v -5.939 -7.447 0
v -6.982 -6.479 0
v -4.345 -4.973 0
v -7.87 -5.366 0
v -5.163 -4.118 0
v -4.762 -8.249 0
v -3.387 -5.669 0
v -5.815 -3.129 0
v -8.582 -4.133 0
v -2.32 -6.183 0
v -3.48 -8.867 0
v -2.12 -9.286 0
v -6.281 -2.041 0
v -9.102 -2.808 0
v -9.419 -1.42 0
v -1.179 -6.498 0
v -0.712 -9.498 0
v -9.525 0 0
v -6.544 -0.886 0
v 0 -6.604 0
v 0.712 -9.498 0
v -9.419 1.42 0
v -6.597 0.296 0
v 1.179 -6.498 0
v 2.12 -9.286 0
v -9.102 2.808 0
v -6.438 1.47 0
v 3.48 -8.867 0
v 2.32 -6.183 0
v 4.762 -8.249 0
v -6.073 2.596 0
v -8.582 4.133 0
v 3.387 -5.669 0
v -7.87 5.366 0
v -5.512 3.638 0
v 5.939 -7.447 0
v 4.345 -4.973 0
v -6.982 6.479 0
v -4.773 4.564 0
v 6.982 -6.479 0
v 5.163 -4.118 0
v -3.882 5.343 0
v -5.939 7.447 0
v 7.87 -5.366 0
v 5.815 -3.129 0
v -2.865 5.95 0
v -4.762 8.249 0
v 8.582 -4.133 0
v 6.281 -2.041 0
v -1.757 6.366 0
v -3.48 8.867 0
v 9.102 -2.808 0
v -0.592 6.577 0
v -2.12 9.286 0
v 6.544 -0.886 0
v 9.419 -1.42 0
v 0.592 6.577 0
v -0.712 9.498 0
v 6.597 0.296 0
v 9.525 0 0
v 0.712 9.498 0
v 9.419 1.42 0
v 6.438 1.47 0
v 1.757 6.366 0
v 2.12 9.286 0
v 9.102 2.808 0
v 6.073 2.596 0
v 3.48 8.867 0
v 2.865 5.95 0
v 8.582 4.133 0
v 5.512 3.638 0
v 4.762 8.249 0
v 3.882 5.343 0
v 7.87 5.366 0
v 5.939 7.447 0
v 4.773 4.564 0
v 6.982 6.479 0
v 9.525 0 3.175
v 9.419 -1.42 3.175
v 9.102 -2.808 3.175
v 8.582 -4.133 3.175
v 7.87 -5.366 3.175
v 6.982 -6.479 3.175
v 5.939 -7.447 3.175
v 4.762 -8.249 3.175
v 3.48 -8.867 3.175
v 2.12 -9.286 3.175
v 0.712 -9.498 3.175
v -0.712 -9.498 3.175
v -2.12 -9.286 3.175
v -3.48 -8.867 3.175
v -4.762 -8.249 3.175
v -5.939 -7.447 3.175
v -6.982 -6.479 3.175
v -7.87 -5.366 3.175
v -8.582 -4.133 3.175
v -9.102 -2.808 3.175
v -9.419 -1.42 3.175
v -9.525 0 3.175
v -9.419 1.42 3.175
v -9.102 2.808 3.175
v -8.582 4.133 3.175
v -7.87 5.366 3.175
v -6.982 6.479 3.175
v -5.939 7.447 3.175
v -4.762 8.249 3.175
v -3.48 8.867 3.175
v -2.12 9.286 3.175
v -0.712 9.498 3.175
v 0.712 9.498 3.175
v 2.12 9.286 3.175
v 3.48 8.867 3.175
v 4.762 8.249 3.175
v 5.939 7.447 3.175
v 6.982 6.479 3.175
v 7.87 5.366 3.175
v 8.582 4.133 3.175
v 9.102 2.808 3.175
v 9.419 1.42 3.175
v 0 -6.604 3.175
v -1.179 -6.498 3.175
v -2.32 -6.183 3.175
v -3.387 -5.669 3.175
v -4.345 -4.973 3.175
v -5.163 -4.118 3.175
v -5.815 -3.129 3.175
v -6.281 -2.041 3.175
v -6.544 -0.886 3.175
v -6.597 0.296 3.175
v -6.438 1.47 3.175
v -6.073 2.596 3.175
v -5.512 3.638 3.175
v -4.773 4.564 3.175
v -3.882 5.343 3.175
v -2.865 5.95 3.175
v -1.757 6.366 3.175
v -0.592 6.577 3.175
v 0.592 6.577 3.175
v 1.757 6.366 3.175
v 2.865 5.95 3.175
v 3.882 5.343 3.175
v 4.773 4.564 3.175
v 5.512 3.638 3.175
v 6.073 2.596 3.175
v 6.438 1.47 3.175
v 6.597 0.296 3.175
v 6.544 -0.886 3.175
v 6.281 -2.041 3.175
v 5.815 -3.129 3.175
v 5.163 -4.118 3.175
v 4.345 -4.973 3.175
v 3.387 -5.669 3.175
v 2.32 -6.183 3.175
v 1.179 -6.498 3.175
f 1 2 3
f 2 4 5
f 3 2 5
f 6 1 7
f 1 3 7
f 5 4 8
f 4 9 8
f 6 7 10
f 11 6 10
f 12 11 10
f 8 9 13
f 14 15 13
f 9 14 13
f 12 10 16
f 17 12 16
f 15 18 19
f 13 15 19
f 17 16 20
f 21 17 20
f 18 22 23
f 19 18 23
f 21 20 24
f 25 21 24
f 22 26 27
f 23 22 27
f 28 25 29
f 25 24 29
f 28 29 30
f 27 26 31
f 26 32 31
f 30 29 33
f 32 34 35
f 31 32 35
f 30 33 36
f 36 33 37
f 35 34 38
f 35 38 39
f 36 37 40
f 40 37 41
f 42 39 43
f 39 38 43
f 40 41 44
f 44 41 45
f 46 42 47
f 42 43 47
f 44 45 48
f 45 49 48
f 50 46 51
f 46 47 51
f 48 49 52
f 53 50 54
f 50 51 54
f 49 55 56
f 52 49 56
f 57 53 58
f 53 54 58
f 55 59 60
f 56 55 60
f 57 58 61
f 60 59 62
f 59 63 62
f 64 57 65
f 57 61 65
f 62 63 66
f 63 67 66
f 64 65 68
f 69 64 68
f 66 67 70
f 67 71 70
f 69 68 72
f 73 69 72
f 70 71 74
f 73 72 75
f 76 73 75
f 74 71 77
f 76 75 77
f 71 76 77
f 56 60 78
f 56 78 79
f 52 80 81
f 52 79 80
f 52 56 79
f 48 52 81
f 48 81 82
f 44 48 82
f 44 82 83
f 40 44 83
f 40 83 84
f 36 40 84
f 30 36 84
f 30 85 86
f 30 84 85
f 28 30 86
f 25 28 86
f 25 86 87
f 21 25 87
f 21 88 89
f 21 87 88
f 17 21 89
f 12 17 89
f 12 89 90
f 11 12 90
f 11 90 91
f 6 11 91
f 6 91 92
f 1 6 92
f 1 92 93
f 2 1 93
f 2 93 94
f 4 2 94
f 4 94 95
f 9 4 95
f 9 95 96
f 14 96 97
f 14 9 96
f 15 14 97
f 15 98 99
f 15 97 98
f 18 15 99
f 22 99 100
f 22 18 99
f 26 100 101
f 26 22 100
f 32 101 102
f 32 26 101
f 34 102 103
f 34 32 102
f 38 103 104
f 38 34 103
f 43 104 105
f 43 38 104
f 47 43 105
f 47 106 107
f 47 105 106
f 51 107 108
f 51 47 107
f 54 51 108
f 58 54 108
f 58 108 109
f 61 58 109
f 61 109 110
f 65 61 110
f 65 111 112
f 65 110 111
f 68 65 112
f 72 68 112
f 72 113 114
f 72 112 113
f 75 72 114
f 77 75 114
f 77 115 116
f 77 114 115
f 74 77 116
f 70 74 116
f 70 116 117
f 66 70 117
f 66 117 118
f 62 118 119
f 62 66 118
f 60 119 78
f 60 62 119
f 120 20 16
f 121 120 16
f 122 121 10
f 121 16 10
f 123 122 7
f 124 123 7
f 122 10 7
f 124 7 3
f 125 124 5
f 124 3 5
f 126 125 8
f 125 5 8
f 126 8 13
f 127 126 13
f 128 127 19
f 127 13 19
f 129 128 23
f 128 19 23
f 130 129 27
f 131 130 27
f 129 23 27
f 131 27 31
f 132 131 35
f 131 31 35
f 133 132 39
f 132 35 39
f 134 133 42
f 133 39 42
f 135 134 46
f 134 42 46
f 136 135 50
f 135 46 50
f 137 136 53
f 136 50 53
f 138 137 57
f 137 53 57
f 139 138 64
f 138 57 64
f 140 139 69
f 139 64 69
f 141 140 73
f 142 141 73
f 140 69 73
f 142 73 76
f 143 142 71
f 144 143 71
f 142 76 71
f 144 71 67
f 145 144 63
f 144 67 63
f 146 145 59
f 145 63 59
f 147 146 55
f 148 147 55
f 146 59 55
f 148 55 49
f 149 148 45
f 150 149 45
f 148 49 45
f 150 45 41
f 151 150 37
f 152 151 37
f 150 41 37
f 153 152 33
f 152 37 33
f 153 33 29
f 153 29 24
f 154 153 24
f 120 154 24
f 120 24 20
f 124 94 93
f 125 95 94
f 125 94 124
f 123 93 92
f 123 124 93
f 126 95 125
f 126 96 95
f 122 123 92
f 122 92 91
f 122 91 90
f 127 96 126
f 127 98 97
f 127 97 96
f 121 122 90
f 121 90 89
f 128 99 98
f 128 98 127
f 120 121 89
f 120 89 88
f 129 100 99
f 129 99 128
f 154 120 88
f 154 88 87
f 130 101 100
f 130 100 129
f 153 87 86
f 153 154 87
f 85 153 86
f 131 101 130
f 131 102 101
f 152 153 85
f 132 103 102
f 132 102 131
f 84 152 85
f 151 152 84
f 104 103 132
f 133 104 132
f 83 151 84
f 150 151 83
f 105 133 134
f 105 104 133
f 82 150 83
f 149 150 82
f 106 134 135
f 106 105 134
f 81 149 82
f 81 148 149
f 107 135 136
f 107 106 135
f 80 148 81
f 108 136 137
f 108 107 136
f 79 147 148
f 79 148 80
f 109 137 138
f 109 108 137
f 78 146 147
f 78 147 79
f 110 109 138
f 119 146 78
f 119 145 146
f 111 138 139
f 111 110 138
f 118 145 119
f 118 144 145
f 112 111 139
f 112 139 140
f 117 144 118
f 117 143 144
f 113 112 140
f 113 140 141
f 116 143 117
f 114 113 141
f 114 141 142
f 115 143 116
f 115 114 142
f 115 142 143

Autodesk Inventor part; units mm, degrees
ref_plane "YZ Plane" through (0, 0, 0) normal (1, 0, 0) x (0, 1, 0)
ref_plane "XZ Plane" through (0, 0, 0) normal (0, 1, 0) x (-1, 0, 0)
ref_plane "XY Plane" through (0, 0, 0) normal (0, 0, 1) x (1, 0, 0)
sketch "Sketch1" plane through (0, 0, 0) normal (0, 0, 1) x (1, 0, 0)
  circle A0 centre (0, 0) radius 9.525
  dimension "d0" = 19.05
extrude "Extrusion1" add sketch "Sketch1" along normal blind 3.175
sketch "Sketch2" plane through (0, 0, 3.175) normal (0, 0, 1) x (1, 0, 0)
  point P0 (0, 0)
  point P1 (0, 0)
hole "Hole1" at (0, 0, 3.175) direction (0, 0, -1) diameter 12.954 depth 25.4 tip angle 118
sketch "Sketch3" plane through (0, 0, 3.175) normal (0, 0, 1) x (1, 0, 0)
  point P0 (0, 0)
hole "Hole2" at (0, 0, 3.175) direction (0, 0, -1) diameter 13.208 depth 25.4 tip angle 118
properties part number "washer achobotics"
